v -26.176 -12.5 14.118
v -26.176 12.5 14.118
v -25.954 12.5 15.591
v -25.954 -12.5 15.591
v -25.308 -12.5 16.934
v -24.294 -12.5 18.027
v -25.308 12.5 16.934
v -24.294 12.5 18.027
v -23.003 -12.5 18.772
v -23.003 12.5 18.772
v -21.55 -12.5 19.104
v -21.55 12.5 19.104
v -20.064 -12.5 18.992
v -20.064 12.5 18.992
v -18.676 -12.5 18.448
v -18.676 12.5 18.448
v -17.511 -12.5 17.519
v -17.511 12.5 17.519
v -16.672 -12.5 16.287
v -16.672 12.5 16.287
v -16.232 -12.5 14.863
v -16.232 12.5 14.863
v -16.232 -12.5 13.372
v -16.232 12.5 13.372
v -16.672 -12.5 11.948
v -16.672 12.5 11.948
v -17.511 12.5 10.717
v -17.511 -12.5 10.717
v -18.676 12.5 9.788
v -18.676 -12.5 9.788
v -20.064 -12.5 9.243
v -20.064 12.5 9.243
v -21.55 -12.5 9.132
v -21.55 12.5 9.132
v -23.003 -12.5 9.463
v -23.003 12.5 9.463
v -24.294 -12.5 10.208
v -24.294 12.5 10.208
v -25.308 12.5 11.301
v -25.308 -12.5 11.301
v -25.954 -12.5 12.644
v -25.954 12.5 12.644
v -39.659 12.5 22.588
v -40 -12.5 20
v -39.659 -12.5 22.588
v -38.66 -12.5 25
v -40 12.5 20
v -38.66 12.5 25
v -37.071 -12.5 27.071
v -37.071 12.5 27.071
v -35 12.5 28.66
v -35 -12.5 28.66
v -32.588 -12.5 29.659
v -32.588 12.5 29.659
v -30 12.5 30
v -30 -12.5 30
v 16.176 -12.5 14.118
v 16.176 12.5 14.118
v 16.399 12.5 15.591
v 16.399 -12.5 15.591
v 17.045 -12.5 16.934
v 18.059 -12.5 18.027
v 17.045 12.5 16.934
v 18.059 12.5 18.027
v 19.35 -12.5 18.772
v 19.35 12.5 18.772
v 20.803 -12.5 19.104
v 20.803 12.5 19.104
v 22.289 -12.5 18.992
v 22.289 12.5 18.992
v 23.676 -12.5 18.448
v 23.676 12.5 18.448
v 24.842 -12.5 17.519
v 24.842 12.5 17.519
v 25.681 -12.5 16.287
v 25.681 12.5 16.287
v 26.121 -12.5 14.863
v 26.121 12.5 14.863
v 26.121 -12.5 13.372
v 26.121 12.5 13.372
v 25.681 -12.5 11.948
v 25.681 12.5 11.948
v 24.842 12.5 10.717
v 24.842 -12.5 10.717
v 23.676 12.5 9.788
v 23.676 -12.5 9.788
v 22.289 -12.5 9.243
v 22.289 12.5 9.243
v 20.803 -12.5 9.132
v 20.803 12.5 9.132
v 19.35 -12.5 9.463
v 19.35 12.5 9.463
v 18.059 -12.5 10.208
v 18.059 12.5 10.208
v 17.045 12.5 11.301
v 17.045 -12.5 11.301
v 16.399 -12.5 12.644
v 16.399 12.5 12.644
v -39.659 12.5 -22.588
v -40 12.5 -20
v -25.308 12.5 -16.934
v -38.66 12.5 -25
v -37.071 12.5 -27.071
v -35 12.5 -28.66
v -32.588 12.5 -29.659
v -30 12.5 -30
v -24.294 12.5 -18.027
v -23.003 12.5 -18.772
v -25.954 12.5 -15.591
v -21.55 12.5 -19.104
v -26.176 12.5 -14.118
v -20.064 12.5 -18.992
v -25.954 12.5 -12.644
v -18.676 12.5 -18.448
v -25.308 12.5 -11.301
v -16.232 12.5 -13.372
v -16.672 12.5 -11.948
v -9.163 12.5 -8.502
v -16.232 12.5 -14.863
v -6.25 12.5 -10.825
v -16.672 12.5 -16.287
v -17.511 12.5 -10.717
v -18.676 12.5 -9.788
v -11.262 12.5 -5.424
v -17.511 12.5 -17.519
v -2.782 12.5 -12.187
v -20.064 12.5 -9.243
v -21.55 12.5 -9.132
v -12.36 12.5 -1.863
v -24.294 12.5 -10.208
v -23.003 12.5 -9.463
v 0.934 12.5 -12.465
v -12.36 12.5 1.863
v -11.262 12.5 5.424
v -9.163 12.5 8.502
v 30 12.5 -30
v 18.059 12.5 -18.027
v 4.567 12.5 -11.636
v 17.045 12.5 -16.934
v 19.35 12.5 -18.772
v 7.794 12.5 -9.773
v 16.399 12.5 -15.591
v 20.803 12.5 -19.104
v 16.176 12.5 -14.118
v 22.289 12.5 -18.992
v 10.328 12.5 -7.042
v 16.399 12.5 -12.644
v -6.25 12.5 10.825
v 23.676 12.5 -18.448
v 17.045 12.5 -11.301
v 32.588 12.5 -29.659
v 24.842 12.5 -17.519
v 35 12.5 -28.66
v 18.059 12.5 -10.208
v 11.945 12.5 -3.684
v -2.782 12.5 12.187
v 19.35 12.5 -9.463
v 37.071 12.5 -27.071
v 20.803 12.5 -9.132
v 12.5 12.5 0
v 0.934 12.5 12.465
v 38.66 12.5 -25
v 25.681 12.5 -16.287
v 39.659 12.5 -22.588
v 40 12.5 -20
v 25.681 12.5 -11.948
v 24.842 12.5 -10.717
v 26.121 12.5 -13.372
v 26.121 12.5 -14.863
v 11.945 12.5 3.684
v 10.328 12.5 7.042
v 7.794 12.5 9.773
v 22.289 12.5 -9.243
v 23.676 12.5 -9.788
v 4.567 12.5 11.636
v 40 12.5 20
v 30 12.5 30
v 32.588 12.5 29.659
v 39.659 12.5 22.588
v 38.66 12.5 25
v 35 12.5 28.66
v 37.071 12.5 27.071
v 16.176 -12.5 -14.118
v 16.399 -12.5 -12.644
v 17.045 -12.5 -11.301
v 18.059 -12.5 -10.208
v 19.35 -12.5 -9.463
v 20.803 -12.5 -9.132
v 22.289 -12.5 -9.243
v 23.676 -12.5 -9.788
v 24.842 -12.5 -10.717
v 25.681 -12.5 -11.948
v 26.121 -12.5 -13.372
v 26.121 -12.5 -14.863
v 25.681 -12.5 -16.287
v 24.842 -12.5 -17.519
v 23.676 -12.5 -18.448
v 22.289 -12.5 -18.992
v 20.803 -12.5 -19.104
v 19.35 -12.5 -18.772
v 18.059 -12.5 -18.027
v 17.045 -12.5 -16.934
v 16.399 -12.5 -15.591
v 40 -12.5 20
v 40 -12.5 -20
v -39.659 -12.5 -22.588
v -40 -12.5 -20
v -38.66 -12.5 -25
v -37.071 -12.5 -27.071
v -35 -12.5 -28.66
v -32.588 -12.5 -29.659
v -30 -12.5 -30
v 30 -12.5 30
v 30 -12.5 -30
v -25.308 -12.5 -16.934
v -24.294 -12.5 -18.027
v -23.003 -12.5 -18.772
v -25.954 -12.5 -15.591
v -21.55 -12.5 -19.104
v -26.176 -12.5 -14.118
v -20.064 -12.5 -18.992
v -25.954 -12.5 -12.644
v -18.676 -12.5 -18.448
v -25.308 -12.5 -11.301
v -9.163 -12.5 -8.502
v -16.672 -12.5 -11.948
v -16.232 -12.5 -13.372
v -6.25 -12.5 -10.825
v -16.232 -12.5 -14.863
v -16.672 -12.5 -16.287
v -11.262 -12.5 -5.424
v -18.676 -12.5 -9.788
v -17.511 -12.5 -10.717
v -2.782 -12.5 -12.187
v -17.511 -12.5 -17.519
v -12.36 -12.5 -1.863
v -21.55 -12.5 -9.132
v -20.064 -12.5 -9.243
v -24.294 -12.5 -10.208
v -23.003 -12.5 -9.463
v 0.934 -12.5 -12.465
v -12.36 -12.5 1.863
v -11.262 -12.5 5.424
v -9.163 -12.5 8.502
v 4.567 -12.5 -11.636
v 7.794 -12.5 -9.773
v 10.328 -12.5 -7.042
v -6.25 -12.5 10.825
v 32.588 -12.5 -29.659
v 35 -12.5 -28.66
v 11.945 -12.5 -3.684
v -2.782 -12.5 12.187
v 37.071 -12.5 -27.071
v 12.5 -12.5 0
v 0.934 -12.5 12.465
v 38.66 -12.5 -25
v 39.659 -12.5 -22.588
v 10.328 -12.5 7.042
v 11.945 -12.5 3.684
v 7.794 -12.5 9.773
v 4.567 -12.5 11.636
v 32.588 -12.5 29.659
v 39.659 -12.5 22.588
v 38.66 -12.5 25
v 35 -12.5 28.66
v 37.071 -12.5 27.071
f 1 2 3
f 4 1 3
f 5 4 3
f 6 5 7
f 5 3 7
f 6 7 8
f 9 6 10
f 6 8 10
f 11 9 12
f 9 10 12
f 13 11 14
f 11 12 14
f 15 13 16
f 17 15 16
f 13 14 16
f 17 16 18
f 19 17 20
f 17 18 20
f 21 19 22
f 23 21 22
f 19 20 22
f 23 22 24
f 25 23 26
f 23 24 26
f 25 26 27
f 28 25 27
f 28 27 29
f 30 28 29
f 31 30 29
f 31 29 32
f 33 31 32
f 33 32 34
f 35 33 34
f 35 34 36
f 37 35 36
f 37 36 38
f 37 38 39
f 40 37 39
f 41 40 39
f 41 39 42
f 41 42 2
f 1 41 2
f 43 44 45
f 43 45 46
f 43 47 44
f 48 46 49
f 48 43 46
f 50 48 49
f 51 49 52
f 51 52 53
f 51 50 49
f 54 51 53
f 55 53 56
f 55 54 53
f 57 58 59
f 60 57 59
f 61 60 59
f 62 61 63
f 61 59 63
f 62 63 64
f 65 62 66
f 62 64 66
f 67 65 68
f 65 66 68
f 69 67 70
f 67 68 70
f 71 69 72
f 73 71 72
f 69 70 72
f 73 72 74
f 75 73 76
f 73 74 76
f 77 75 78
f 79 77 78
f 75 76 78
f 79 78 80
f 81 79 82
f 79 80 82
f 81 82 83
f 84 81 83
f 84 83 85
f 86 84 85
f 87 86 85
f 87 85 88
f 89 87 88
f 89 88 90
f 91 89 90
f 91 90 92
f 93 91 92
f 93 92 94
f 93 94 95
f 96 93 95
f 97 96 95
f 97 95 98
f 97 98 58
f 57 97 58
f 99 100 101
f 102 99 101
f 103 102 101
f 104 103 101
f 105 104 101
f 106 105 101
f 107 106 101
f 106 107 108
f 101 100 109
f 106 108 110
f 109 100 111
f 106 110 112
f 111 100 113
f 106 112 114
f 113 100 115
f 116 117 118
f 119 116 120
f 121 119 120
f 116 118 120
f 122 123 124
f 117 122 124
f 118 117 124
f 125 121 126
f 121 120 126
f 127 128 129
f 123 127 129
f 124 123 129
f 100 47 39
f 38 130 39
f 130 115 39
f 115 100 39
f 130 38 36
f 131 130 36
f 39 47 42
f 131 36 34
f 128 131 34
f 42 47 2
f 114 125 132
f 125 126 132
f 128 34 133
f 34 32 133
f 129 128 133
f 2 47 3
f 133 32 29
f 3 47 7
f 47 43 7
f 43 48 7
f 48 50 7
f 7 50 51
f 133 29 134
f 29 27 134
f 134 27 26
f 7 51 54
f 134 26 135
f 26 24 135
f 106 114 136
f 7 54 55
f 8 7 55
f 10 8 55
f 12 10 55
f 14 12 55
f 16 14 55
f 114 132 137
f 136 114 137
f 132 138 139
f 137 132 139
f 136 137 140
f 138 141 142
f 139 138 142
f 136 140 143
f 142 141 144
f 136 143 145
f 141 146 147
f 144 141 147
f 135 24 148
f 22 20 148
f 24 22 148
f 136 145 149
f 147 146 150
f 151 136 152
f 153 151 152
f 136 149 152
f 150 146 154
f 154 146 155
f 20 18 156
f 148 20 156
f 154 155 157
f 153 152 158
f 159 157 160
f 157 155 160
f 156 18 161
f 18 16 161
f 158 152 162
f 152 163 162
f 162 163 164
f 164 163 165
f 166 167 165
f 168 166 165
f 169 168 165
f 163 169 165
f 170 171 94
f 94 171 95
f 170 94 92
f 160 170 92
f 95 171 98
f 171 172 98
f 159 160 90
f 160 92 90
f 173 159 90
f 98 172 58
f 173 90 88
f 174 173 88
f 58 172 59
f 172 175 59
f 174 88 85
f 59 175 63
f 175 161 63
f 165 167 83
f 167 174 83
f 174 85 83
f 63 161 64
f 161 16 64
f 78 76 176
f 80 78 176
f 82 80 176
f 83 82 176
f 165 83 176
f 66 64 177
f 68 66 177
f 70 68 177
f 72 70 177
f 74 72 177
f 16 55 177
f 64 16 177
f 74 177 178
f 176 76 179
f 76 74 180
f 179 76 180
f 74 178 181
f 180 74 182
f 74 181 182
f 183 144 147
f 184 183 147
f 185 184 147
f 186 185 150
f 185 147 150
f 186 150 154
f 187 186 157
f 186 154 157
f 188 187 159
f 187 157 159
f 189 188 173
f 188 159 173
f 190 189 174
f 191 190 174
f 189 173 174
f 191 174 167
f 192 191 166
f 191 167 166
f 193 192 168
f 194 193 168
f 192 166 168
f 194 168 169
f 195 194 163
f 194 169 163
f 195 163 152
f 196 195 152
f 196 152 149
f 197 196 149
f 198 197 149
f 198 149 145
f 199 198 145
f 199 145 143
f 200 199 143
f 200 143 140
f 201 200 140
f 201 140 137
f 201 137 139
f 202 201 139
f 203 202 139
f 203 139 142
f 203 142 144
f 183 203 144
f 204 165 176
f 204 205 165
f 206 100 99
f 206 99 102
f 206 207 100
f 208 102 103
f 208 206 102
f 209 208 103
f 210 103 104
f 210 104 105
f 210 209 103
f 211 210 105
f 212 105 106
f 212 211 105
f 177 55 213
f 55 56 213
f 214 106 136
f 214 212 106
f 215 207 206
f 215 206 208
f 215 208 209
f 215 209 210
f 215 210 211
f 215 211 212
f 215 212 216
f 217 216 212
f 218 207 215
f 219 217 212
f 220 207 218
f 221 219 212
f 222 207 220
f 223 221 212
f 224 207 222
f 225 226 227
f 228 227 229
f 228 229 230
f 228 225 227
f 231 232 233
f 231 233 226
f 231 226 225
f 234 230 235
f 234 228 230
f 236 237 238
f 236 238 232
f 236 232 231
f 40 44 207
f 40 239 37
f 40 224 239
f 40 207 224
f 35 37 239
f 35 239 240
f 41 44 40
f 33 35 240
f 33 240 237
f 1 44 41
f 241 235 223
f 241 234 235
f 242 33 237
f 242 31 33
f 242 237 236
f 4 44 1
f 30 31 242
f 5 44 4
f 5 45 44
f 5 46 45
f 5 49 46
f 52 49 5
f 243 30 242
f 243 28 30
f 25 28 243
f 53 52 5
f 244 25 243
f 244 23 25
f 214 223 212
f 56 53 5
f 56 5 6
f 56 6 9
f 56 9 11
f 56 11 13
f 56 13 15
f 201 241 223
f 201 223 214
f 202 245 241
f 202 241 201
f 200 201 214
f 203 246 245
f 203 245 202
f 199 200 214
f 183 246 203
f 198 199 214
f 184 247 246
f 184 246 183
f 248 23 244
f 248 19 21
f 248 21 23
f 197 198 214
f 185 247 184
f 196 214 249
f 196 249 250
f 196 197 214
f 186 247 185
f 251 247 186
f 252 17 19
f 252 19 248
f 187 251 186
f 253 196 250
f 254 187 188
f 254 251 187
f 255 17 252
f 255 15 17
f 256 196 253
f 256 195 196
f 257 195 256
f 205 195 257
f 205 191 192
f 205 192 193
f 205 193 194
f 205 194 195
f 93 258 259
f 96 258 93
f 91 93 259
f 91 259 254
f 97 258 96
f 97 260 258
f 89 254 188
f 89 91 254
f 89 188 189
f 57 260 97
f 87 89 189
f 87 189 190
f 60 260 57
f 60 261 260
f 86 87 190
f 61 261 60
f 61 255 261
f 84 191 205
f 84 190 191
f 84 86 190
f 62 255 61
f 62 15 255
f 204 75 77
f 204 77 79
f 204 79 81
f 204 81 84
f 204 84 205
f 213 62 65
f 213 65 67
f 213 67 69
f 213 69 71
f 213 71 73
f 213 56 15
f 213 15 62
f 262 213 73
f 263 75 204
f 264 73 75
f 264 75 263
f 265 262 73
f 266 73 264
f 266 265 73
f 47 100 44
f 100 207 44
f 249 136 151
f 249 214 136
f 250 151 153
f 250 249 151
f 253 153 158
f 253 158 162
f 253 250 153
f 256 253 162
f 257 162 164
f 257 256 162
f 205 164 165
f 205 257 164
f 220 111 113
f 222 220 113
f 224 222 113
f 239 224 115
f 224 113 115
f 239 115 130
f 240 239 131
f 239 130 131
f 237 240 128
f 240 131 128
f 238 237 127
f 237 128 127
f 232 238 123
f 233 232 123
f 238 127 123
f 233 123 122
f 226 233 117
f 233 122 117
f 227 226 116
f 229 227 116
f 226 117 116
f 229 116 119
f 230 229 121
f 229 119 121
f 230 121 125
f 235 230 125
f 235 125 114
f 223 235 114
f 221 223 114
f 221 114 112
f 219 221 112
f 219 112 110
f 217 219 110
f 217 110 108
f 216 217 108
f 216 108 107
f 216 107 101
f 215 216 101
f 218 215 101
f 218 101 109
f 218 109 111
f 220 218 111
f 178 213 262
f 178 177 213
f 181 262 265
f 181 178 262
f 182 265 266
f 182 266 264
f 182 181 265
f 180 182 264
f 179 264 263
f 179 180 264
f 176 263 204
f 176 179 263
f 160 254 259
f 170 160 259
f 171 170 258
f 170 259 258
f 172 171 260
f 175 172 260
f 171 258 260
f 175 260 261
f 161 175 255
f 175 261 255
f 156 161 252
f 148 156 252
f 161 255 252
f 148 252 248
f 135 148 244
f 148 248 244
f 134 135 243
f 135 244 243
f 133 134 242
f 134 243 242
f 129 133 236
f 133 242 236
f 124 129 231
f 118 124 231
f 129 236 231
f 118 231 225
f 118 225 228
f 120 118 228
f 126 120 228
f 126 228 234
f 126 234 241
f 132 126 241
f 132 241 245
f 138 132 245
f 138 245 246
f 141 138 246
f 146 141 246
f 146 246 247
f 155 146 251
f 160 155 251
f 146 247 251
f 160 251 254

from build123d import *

# Parameters (mm, degrees)
F0_W     = 80
F0_H     = 60
F1_DEPTH = 12.5
F2_R     = 12.5
F3_DEPTH = 25
F4_R     = 10
F6_D     = 10


with BuildPart() as f1:
    # F0 (on Front) → F1 (new body, symmetric)
    with BuildSketch(Plane.XZ):
        Rectangle(F0_W, F0_H)
    extrude(amount=F1_DEPTH, both=True)

    # F2 (on face) → F3 (cut, through all)
    with BuildSketch(Plane.XZ.offset(12.5)):
        Circle(F2_R)
    extrude(amount=-F3_DEPTH, mode=Mode.SUBTRACT)

    # F4
    f4_edges = [f1.edges().sort_by_distance(p)[0] for p in [
        (-40, 0, 30),
        (40, 0, 30),
        (40, 0, -30),
        (-40, 0, -30),
    ]]
    fillet(f4_edges, radius=F4_R)

    # F6 (through all)
    with Locations(Plane.XZ.offset(12.5)):
        with Locations((-21.176471, 14.117647), (-21.176471, -14.117647), (21.176471, 14.117647), (21.176471, -14.117647)):
            Hole(F6_D / 2)


solid = f1.part
